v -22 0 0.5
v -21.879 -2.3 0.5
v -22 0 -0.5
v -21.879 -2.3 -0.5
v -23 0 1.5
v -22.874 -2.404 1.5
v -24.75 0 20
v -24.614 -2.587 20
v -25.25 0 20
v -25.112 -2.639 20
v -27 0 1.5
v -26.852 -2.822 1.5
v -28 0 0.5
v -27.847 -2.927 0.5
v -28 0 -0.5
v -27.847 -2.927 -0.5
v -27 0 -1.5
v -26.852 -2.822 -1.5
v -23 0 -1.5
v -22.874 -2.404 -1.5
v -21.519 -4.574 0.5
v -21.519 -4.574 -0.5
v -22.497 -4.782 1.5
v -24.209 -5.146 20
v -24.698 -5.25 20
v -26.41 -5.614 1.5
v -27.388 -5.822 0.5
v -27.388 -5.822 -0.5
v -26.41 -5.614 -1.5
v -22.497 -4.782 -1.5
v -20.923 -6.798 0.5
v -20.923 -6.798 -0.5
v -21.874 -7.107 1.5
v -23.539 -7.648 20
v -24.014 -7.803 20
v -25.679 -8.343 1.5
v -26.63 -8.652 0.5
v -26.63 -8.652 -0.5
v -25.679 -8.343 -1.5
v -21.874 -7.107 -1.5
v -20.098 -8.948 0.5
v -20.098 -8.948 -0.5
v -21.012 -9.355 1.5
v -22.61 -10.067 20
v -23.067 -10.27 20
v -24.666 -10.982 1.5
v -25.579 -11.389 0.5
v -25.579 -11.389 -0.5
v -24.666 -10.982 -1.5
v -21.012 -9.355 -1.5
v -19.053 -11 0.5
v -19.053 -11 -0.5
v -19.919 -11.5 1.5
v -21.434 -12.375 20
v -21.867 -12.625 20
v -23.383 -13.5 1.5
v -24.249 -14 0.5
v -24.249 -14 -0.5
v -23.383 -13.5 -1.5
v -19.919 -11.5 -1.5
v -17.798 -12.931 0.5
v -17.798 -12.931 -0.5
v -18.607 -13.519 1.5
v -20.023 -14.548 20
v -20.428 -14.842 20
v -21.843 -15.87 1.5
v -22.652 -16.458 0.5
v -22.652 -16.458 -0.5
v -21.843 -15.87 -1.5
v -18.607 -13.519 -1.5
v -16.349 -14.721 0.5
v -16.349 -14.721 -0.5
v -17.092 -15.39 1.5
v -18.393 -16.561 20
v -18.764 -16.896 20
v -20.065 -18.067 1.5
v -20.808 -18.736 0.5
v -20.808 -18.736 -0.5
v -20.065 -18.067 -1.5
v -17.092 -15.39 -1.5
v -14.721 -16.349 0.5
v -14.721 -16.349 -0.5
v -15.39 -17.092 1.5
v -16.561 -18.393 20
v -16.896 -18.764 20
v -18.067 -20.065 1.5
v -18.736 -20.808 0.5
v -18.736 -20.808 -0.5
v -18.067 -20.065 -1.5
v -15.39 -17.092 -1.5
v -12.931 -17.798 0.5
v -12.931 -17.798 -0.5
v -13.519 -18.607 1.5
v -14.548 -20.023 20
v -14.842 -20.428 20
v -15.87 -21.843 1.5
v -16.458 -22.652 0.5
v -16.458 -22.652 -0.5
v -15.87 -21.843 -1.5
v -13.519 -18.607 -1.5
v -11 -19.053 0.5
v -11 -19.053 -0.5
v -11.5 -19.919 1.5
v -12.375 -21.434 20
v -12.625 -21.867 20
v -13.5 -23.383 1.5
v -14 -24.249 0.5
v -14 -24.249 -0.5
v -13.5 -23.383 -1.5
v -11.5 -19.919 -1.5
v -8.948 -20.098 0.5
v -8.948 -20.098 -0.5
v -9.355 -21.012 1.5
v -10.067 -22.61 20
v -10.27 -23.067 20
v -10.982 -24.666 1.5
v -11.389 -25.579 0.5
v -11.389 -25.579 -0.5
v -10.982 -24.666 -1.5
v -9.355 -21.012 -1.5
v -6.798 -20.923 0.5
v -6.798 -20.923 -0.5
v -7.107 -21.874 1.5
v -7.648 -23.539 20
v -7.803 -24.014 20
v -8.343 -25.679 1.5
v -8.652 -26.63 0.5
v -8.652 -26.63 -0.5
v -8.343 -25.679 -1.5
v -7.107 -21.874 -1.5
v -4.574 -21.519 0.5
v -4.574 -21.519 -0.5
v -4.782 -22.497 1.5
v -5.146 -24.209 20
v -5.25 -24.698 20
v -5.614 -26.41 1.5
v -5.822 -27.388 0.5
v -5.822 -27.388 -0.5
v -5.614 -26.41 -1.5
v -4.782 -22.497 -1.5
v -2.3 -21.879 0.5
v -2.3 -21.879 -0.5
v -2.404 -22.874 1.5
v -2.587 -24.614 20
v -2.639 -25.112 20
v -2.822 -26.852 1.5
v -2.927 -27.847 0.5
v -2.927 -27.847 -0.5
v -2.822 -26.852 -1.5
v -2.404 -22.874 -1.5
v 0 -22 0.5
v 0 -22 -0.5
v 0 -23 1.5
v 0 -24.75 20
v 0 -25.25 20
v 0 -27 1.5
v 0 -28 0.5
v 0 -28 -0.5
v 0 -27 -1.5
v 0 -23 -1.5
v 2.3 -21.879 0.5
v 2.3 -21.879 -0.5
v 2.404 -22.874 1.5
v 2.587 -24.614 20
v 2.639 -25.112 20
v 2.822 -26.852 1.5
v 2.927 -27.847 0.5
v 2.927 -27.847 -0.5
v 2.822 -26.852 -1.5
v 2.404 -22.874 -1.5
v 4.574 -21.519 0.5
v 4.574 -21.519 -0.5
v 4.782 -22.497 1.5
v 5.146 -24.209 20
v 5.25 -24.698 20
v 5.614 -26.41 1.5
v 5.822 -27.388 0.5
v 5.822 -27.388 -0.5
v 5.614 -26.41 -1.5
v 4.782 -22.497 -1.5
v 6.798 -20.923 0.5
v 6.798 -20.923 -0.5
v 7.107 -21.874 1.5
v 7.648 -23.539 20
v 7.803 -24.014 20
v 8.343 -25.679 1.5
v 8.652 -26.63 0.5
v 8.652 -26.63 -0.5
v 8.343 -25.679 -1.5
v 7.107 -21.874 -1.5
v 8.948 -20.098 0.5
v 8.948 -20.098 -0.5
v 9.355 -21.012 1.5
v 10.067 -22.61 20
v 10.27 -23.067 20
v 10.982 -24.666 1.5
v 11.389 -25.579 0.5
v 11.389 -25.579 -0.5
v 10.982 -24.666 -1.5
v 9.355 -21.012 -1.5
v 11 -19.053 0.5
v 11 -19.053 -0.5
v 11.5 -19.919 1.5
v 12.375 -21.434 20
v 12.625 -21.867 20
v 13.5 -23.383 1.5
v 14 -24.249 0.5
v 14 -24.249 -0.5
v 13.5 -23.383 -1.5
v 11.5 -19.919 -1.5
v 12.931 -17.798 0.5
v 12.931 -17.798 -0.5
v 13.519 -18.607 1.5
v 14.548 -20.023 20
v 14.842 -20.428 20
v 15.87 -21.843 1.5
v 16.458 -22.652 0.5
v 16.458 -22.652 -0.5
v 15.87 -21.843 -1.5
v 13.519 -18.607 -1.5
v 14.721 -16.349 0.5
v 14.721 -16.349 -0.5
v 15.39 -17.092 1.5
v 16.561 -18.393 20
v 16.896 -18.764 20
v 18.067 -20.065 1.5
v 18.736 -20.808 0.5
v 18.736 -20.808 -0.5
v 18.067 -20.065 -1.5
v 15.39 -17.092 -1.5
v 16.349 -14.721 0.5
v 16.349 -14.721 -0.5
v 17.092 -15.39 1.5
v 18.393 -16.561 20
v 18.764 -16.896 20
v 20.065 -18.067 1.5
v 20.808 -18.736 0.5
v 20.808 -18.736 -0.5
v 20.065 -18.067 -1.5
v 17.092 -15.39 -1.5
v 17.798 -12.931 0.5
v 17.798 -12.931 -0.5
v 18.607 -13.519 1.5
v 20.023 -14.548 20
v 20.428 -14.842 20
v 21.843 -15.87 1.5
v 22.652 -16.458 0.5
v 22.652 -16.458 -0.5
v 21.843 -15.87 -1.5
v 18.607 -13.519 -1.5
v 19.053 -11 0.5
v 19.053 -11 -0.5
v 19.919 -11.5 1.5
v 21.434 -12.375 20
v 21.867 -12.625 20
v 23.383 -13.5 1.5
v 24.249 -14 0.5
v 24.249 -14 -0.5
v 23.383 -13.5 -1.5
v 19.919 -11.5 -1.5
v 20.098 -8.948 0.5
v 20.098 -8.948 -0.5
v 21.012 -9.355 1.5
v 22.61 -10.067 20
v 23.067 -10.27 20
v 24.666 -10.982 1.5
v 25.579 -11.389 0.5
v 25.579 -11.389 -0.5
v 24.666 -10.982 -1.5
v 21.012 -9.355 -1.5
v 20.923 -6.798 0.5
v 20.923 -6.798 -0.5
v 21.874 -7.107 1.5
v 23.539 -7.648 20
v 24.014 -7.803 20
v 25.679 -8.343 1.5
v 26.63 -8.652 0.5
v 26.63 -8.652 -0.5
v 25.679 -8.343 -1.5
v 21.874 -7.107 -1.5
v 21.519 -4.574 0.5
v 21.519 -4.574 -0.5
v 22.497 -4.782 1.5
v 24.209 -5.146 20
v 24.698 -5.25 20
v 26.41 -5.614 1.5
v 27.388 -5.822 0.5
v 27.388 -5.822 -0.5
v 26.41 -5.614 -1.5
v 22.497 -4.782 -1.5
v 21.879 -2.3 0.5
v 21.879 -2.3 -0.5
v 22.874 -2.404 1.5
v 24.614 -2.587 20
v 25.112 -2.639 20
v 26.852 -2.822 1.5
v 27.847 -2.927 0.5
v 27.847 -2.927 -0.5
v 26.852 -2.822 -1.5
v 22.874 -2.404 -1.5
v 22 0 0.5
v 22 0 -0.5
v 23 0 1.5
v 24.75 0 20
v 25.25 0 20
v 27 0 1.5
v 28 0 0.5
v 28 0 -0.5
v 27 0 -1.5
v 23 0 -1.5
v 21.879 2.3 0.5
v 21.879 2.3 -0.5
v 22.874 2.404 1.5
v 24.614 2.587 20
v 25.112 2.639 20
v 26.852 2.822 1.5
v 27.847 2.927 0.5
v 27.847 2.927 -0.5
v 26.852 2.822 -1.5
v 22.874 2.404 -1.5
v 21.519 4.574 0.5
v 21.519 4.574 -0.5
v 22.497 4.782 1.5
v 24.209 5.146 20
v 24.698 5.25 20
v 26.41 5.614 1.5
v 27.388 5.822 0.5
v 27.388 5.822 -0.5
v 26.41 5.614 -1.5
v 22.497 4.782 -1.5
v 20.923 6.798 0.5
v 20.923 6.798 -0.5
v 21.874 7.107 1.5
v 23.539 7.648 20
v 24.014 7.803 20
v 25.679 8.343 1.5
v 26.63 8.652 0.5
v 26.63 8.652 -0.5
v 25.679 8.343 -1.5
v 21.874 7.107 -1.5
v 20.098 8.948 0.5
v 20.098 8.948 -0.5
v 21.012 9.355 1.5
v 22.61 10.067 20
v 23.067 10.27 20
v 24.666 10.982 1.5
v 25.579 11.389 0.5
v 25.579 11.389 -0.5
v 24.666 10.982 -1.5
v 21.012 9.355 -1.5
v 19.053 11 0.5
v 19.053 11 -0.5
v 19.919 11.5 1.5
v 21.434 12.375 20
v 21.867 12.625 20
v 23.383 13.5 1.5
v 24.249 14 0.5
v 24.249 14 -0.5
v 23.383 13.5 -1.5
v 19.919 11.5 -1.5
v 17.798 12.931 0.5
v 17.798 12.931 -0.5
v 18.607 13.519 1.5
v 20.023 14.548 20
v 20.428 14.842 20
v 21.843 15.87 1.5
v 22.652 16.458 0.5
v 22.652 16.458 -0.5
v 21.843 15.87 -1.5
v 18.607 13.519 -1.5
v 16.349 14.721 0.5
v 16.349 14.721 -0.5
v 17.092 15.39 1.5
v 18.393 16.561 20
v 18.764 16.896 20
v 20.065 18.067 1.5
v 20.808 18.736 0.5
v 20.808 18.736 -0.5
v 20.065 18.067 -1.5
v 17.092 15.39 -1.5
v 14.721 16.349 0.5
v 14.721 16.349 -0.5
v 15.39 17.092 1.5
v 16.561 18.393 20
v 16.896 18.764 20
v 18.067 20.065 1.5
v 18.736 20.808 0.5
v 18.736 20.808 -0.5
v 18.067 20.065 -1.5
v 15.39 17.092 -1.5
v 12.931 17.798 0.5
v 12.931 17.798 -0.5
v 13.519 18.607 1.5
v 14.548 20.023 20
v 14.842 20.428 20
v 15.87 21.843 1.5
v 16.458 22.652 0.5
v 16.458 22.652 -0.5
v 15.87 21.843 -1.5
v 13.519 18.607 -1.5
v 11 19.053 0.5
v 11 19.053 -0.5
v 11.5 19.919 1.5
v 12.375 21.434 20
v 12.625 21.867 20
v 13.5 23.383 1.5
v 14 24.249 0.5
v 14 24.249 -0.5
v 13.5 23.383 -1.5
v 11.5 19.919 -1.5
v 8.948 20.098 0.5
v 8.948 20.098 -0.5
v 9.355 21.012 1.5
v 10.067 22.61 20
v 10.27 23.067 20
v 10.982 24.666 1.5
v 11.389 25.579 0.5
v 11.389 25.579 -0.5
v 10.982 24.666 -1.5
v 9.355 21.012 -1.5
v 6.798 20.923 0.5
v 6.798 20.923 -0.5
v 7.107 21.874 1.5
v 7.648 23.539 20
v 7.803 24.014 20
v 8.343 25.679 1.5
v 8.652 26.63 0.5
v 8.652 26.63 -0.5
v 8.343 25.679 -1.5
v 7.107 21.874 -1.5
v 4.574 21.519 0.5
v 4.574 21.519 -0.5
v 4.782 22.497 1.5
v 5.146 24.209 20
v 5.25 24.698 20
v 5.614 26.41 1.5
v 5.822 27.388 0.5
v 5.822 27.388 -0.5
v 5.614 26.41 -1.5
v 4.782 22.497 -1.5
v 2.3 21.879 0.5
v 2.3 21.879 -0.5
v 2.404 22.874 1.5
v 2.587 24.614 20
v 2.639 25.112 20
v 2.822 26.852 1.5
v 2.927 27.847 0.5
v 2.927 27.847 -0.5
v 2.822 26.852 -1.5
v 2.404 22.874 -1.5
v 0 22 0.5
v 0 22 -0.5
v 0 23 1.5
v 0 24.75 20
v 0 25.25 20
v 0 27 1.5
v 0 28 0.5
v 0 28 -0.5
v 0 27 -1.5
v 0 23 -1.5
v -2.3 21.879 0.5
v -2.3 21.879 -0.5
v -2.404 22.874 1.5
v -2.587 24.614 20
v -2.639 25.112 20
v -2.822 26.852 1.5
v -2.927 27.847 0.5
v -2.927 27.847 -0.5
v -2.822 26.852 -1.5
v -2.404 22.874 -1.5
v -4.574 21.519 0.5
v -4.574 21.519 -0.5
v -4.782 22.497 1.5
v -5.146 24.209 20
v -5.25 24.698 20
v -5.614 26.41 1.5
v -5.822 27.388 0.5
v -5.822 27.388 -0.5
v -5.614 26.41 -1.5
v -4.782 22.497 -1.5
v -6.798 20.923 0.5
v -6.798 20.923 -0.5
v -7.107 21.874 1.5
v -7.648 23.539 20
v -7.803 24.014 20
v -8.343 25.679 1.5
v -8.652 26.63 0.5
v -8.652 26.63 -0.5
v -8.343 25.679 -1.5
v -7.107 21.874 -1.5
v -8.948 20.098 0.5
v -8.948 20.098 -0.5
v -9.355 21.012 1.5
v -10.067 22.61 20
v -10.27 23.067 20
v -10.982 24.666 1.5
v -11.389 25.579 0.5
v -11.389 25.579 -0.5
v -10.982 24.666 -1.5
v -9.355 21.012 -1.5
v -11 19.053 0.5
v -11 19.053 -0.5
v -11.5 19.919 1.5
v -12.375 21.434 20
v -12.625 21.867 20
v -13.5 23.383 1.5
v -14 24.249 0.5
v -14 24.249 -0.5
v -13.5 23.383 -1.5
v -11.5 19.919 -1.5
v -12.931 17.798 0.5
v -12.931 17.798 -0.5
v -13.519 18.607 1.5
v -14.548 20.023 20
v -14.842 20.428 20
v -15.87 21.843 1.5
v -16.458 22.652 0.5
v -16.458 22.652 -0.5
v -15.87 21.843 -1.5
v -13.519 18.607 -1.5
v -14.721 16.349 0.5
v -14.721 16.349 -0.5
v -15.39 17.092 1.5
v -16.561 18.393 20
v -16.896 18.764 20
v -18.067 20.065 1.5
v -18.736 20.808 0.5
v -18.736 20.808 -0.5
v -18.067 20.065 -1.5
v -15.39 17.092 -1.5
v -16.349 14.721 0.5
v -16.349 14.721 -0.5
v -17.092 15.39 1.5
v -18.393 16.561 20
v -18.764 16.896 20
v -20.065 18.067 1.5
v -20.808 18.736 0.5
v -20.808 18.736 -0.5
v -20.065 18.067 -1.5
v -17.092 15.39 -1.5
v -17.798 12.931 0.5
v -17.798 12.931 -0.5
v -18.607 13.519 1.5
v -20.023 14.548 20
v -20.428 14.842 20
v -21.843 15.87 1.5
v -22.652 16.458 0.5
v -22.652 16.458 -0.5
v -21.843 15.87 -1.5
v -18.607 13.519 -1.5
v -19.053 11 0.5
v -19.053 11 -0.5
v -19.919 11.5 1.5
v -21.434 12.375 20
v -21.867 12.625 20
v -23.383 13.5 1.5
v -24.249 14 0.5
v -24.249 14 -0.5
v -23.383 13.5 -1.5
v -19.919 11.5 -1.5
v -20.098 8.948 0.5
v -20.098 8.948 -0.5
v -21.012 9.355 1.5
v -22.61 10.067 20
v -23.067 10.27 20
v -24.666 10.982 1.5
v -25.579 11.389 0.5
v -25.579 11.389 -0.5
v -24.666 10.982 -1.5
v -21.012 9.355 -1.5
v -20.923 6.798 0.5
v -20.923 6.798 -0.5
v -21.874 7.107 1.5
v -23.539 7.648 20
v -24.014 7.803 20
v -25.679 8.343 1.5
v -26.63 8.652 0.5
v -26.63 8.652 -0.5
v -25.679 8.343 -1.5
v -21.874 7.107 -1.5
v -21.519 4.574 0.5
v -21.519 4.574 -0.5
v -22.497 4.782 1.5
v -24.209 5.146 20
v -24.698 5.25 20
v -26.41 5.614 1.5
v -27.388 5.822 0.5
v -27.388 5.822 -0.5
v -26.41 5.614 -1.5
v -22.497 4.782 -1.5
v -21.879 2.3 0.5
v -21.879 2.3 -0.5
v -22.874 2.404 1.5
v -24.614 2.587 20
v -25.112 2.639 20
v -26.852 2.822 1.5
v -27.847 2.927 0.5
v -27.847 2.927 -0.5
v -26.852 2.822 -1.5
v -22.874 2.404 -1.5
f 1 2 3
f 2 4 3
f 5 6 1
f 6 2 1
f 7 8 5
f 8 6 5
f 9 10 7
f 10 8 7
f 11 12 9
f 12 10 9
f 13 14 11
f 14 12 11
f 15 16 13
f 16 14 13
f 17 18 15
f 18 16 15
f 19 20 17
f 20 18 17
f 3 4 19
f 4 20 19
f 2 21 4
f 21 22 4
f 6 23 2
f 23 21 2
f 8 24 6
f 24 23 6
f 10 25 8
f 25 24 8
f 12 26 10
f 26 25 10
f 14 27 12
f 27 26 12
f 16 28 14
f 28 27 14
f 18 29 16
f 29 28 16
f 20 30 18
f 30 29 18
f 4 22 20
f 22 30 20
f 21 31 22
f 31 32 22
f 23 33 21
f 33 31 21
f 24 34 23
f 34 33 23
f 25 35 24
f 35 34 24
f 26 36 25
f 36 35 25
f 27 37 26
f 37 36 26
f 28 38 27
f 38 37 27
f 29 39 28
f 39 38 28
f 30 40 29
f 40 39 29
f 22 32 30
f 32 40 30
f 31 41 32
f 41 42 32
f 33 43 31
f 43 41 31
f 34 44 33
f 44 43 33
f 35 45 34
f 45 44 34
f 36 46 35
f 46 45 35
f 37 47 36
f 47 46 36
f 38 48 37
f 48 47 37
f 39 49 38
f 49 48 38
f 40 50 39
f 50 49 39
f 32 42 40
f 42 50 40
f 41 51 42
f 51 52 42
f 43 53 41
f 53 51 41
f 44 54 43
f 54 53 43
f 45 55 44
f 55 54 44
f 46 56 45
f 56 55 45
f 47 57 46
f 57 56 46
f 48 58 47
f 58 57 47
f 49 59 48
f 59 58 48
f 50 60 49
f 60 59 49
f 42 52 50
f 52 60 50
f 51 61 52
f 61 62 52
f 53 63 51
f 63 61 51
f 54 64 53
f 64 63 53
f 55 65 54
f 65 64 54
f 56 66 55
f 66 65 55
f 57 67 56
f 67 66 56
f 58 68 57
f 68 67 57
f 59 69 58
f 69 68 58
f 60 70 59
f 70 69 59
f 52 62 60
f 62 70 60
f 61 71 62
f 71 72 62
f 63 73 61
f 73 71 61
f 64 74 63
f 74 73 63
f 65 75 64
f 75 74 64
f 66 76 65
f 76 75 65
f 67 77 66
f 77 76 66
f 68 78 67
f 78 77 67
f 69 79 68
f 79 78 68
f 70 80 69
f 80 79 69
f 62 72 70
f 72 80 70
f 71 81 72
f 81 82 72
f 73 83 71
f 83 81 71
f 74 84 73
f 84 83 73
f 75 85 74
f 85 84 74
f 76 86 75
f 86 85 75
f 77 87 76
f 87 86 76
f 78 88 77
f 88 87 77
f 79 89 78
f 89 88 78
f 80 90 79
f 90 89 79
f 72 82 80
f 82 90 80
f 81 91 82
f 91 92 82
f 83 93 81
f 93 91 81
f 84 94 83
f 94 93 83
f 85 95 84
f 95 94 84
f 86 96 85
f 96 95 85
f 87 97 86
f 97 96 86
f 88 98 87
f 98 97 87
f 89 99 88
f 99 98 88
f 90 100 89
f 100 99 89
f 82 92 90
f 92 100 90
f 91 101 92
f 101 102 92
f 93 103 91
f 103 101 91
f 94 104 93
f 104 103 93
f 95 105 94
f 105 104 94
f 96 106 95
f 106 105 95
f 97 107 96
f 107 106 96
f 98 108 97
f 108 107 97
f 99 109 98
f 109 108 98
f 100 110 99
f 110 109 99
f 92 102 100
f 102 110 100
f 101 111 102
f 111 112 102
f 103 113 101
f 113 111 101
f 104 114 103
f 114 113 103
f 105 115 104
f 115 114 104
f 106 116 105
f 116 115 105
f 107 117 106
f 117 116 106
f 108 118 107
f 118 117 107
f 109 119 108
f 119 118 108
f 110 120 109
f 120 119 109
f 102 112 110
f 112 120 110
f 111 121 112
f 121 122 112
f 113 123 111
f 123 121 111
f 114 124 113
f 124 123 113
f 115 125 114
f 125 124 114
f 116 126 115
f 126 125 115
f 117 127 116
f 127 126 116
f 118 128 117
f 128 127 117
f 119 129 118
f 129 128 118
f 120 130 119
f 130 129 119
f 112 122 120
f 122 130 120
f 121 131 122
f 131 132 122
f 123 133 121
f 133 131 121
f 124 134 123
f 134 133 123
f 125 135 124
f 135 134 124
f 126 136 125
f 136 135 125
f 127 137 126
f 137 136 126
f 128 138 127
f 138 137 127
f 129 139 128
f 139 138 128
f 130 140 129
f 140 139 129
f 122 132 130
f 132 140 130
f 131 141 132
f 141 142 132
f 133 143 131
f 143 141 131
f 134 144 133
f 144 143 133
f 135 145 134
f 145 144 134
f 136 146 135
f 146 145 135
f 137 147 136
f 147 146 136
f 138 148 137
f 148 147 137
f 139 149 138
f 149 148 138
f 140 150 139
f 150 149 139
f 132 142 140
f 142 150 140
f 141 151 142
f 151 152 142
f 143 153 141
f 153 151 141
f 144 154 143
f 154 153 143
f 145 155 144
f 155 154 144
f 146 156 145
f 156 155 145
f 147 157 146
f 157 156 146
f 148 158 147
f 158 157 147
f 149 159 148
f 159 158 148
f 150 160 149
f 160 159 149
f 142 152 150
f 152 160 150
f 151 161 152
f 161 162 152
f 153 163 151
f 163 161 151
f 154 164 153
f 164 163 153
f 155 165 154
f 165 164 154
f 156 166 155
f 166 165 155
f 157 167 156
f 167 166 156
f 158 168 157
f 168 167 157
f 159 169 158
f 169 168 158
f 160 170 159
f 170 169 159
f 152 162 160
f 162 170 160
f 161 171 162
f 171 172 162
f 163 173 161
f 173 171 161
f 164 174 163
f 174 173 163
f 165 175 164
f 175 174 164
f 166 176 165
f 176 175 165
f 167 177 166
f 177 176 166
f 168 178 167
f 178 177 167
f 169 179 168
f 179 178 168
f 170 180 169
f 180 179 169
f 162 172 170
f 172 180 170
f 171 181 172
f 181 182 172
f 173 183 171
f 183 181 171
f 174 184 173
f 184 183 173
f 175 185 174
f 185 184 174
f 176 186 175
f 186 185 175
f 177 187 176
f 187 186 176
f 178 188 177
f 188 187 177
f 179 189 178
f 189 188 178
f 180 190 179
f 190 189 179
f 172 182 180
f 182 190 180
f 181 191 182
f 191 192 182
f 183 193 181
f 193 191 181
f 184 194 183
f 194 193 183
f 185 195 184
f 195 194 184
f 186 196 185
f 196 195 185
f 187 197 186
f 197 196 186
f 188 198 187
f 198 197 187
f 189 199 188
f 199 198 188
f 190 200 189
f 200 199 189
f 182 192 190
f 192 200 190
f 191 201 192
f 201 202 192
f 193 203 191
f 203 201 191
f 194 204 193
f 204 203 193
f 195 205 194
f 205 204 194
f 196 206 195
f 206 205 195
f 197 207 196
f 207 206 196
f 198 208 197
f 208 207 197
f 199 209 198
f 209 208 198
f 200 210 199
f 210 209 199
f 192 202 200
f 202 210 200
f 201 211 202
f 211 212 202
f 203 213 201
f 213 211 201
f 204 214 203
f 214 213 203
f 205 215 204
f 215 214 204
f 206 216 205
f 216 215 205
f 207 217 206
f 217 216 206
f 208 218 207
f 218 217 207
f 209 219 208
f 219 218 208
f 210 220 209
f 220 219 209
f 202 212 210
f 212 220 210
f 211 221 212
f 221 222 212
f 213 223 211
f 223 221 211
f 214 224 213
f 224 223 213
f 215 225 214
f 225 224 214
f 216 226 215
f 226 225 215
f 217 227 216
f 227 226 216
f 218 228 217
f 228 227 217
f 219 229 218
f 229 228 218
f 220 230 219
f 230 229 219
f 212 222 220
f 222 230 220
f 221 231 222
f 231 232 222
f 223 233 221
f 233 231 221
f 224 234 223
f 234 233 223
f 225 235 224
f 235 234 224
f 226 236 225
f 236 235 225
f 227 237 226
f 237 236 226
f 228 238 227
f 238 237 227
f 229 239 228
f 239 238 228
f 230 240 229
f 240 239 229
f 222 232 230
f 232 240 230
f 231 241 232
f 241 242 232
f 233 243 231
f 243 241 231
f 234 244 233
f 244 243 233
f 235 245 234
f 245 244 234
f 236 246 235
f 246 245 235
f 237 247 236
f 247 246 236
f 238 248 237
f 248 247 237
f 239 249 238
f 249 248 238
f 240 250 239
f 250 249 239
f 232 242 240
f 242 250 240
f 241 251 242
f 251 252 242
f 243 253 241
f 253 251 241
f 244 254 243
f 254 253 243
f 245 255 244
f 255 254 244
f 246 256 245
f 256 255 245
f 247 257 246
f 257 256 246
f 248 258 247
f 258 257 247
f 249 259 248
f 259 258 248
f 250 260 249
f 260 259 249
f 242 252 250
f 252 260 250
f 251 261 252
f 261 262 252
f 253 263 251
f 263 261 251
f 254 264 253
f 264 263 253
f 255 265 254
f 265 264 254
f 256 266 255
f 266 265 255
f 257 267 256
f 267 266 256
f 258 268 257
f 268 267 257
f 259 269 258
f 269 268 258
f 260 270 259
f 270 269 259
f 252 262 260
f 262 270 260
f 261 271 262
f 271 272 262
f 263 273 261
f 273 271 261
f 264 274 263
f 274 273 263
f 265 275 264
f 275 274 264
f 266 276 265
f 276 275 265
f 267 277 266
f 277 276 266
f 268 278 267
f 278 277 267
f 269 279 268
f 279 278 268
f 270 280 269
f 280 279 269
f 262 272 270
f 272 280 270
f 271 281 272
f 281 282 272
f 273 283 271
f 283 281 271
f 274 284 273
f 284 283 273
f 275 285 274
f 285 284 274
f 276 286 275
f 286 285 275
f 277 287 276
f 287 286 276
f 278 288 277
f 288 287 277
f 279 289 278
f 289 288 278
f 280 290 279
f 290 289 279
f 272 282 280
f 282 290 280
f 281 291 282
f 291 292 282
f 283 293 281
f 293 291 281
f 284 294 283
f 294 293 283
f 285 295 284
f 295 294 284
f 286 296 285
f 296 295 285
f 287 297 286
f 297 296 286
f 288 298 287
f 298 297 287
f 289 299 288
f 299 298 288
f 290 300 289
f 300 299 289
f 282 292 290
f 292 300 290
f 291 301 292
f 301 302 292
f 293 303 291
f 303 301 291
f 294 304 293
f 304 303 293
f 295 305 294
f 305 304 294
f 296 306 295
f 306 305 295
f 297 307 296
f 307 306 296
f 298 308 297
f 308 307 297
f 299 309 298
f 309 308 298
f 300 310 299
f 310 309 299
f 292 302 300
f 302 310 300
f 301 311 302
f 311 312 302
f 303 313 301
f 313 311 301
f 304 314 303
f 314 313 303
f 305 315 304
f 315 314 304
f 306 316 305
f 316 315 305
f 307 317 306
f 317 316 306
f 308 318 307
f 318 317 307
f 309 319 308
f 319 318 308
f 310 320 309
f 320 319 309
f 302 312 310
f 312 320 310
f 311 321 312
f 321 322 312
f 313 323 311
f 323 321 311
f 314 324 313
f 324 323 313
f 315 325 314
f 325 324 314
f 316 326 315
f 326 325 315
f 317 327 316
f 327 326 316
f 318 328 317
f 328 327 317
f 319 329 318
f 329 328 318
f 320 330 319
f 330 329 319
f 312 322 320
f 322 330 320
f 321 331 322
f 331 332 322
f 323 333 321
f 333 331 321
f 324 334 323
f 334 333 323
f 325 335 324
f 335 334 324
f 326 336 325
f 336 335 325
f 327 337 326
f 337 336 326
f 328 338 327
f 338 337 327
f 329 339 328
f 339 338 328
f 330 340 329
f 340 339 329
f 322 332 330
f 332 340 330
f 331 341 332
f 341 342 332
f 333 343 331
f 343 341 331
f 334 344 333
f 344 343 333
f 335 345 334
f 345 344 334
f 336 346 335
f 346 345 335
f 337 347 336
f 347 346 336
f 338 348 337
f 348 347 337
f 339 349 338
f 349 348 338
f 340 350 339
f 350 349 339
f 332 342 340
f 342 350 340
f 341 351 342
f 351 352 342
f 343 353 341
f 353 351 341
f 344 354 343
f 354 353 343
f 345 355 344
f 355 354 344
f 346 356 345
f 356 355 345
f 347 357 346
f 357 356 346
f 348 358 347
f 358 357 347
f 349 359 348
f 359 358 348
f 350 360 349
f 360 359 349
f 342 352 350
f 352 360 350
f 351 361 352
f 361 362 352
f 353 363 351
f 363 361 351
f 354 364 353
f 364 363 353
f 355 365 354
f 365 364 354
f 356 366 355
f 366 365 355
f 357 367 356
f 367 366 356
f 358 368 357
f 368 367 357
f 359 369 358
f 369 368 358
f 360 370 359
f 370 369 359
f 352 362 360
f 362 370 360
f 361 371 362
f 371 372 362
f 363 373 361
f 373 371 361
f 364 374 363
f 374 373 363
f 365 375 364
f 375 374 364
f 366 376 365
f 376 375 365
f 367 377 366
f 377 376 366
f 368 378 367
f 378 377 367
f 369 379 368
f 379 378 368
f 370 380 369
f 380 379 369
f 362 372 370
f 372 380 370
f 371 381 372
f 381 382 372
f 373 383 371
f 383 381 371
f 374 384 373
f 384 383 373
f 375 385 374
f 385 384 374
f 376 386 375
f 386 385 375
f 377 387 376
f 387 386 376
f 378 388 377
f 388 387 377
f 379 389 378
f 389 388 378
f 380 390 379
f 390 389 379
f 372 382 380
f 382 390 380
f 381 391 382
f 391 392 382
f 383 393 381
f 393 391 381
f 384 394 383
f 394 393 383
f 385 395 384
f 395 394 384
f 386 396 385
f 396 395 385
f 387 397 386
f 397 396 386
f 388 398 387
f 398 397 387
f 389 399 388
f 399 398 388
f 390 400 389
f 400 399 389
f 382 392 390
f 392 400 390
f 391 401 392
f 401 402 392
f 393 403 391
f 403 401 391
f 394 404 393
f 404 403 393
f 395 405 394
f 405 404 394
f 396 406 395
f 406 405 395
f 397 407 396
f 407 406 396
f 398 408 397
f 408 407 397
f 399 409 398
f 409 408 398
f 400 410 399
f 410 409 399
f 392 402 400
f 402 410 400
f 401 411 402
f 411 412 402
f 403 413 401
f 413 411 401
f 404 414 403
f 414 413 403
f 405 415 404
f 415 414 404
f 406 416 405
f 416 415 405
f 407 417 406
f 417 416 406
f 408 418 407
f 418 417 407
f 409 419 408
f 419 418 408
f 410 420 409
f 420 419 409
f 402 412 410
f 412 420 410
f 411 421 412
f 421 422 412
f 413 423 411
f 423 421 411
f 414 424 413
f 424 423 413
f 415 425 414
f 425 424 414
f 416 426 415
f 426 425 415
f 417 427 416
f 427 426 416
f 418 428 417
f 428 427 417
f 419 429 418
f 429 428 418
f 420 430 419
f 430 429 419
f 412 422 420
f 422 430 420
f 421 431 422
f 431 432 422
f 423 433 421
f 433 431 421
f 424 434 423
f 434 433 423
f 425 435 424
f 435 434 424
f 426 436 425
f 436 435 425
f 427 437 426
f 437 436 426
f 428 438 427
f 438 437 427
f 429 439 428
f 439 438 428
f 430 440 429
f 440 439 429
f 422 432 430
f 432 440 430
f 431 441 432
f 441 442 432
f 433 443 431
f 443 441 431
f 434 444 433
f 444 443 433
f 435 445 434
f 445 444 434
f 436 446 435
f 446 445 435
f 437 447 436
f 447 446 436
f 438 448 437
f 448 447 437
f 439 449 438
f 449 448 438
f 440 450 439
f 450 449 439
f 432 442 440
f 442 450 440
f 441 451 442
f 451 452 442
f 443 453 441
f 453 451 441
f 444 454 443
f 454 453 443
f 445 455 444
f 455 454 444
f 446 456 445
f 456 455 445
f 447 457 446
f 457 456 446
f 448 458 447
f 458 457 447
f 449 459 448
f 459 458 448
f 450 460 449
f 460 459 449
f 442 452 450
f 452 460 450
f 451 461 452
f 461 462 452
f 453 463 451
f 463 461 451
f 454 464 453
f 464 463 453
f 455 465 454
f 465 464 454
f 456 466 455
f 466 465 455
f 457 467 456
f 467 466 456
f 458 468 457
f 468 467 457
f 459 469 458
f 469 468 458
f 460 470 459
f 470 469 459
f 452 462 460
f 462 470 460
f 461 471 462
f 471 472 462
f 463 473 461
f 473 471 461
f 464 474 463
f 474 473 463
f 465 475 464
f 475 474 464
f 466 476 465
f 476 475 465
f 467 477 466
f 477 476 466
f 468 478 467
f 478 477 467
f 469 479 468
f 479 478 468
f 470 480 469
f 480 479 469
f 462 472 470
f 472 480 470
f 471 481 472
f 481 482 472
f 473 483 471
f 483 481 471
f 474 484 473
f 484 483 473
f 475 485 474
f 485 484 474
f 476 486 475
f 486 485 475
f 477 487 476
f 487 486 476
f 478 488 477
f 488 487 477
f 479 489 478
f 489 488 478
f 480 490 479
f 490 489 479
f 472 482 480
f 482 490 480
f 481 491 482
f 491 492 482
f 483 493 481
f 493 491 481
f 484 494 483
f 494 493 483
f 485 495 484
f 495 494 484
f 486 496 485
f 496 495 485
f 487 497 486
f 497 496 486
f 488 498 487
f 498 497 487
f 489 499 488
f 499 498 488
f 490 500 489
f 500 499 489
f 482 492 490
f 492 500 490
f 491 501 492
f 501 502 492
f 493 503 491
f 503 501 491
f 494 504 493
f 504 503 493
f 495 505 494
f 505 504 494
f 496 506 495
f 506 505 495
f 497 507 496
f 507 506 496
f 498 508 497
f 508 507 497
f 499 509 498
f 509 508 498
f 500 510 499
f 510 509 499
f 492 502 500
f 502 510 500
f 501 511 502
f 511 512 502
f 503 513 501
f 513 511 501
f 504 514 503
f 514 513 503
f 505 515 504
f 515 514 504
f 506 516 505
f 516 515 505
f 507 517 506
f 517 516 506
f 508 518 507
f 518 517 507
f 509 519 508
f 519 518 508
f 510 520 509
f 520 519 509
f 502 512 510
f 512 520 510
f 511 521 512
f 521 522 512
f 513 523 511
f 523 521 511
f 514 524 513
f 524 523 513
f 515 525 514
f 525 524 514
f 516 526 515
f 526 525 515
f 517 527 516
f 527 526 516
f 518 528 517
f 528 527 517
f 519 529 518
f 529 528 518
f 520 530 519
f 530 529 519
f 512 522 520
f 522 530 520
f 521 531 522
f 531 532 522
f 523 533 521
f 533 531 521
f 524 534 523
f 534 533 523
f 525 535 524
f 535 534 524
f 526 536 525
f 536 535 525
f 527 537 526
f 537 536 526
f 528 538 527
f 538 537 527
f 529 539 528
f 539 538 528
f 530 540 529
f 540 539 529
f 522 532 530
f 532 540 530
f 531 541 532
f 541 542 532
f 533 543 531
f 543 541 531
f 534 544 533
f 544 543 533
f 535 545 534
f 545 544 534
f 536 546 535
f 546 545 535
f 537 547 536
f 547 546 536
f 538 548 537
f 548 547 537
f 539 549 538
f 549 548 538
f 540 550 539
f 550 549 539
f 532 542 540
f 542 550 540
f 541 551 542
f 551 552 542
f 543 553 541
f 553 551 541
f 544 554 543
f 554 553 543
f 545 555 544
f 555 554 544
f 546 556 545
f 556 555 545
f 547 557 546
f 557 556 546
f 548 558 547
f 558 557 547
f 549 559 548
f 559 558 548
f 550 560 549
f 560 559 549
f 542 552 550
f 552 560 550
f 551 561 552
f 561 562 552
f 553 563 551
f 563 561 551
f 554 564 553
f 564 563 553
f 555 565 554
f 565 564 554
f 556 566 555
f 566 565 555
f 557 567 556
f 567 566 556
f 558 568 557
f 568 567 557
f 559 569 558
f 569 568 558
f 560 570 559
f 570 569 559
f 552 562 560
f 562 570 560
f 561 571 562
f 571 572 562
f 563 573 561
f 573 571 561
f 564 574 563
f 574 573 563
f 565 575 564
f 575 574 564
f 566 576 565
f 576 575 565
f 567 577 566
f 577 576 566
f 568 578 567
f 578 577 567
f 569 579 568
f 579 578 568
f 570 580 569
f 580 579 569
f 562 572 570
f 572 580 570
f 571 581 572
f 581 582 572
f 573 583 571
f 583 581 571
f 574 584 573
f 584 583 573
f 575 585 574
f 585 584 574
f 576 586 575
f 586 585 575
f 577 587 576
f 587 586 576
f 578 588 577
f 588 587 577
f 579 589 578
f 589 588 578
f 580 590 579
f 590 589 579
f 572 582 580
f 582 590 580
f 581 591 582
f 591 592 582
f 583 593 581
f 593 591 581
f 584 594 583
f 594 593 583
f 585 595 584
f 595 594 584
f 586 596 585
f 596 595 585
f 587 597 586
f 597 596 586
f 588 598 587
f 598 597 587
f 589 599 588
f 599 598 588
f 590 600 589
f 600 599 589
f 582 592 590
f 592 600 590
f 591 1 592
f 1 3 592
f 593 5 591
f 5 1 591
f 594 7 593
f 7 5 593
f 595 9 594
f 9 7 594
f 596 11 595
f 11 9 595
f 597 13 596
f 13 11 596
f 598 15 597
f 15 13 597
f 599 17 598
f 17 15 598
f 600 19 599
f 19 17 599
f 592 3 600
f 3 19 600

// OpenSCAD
module template()polygon([[0,-20],[0.25,-20],[2,-1.5],[3,-0.5],[3,0.5],[2,1.5],[0,1.5],[0,-20]]);
module template2()union(){template();mirror()template();}
module nail()rotate_extrude()template();
//{translate([5,20,0])nail();translate([20,10,0])nail();}
//linear_extrude(height=5)template2();
rotate([180,0,0])rotate_extrude($fn=60)translate([25,0,0])template2();
